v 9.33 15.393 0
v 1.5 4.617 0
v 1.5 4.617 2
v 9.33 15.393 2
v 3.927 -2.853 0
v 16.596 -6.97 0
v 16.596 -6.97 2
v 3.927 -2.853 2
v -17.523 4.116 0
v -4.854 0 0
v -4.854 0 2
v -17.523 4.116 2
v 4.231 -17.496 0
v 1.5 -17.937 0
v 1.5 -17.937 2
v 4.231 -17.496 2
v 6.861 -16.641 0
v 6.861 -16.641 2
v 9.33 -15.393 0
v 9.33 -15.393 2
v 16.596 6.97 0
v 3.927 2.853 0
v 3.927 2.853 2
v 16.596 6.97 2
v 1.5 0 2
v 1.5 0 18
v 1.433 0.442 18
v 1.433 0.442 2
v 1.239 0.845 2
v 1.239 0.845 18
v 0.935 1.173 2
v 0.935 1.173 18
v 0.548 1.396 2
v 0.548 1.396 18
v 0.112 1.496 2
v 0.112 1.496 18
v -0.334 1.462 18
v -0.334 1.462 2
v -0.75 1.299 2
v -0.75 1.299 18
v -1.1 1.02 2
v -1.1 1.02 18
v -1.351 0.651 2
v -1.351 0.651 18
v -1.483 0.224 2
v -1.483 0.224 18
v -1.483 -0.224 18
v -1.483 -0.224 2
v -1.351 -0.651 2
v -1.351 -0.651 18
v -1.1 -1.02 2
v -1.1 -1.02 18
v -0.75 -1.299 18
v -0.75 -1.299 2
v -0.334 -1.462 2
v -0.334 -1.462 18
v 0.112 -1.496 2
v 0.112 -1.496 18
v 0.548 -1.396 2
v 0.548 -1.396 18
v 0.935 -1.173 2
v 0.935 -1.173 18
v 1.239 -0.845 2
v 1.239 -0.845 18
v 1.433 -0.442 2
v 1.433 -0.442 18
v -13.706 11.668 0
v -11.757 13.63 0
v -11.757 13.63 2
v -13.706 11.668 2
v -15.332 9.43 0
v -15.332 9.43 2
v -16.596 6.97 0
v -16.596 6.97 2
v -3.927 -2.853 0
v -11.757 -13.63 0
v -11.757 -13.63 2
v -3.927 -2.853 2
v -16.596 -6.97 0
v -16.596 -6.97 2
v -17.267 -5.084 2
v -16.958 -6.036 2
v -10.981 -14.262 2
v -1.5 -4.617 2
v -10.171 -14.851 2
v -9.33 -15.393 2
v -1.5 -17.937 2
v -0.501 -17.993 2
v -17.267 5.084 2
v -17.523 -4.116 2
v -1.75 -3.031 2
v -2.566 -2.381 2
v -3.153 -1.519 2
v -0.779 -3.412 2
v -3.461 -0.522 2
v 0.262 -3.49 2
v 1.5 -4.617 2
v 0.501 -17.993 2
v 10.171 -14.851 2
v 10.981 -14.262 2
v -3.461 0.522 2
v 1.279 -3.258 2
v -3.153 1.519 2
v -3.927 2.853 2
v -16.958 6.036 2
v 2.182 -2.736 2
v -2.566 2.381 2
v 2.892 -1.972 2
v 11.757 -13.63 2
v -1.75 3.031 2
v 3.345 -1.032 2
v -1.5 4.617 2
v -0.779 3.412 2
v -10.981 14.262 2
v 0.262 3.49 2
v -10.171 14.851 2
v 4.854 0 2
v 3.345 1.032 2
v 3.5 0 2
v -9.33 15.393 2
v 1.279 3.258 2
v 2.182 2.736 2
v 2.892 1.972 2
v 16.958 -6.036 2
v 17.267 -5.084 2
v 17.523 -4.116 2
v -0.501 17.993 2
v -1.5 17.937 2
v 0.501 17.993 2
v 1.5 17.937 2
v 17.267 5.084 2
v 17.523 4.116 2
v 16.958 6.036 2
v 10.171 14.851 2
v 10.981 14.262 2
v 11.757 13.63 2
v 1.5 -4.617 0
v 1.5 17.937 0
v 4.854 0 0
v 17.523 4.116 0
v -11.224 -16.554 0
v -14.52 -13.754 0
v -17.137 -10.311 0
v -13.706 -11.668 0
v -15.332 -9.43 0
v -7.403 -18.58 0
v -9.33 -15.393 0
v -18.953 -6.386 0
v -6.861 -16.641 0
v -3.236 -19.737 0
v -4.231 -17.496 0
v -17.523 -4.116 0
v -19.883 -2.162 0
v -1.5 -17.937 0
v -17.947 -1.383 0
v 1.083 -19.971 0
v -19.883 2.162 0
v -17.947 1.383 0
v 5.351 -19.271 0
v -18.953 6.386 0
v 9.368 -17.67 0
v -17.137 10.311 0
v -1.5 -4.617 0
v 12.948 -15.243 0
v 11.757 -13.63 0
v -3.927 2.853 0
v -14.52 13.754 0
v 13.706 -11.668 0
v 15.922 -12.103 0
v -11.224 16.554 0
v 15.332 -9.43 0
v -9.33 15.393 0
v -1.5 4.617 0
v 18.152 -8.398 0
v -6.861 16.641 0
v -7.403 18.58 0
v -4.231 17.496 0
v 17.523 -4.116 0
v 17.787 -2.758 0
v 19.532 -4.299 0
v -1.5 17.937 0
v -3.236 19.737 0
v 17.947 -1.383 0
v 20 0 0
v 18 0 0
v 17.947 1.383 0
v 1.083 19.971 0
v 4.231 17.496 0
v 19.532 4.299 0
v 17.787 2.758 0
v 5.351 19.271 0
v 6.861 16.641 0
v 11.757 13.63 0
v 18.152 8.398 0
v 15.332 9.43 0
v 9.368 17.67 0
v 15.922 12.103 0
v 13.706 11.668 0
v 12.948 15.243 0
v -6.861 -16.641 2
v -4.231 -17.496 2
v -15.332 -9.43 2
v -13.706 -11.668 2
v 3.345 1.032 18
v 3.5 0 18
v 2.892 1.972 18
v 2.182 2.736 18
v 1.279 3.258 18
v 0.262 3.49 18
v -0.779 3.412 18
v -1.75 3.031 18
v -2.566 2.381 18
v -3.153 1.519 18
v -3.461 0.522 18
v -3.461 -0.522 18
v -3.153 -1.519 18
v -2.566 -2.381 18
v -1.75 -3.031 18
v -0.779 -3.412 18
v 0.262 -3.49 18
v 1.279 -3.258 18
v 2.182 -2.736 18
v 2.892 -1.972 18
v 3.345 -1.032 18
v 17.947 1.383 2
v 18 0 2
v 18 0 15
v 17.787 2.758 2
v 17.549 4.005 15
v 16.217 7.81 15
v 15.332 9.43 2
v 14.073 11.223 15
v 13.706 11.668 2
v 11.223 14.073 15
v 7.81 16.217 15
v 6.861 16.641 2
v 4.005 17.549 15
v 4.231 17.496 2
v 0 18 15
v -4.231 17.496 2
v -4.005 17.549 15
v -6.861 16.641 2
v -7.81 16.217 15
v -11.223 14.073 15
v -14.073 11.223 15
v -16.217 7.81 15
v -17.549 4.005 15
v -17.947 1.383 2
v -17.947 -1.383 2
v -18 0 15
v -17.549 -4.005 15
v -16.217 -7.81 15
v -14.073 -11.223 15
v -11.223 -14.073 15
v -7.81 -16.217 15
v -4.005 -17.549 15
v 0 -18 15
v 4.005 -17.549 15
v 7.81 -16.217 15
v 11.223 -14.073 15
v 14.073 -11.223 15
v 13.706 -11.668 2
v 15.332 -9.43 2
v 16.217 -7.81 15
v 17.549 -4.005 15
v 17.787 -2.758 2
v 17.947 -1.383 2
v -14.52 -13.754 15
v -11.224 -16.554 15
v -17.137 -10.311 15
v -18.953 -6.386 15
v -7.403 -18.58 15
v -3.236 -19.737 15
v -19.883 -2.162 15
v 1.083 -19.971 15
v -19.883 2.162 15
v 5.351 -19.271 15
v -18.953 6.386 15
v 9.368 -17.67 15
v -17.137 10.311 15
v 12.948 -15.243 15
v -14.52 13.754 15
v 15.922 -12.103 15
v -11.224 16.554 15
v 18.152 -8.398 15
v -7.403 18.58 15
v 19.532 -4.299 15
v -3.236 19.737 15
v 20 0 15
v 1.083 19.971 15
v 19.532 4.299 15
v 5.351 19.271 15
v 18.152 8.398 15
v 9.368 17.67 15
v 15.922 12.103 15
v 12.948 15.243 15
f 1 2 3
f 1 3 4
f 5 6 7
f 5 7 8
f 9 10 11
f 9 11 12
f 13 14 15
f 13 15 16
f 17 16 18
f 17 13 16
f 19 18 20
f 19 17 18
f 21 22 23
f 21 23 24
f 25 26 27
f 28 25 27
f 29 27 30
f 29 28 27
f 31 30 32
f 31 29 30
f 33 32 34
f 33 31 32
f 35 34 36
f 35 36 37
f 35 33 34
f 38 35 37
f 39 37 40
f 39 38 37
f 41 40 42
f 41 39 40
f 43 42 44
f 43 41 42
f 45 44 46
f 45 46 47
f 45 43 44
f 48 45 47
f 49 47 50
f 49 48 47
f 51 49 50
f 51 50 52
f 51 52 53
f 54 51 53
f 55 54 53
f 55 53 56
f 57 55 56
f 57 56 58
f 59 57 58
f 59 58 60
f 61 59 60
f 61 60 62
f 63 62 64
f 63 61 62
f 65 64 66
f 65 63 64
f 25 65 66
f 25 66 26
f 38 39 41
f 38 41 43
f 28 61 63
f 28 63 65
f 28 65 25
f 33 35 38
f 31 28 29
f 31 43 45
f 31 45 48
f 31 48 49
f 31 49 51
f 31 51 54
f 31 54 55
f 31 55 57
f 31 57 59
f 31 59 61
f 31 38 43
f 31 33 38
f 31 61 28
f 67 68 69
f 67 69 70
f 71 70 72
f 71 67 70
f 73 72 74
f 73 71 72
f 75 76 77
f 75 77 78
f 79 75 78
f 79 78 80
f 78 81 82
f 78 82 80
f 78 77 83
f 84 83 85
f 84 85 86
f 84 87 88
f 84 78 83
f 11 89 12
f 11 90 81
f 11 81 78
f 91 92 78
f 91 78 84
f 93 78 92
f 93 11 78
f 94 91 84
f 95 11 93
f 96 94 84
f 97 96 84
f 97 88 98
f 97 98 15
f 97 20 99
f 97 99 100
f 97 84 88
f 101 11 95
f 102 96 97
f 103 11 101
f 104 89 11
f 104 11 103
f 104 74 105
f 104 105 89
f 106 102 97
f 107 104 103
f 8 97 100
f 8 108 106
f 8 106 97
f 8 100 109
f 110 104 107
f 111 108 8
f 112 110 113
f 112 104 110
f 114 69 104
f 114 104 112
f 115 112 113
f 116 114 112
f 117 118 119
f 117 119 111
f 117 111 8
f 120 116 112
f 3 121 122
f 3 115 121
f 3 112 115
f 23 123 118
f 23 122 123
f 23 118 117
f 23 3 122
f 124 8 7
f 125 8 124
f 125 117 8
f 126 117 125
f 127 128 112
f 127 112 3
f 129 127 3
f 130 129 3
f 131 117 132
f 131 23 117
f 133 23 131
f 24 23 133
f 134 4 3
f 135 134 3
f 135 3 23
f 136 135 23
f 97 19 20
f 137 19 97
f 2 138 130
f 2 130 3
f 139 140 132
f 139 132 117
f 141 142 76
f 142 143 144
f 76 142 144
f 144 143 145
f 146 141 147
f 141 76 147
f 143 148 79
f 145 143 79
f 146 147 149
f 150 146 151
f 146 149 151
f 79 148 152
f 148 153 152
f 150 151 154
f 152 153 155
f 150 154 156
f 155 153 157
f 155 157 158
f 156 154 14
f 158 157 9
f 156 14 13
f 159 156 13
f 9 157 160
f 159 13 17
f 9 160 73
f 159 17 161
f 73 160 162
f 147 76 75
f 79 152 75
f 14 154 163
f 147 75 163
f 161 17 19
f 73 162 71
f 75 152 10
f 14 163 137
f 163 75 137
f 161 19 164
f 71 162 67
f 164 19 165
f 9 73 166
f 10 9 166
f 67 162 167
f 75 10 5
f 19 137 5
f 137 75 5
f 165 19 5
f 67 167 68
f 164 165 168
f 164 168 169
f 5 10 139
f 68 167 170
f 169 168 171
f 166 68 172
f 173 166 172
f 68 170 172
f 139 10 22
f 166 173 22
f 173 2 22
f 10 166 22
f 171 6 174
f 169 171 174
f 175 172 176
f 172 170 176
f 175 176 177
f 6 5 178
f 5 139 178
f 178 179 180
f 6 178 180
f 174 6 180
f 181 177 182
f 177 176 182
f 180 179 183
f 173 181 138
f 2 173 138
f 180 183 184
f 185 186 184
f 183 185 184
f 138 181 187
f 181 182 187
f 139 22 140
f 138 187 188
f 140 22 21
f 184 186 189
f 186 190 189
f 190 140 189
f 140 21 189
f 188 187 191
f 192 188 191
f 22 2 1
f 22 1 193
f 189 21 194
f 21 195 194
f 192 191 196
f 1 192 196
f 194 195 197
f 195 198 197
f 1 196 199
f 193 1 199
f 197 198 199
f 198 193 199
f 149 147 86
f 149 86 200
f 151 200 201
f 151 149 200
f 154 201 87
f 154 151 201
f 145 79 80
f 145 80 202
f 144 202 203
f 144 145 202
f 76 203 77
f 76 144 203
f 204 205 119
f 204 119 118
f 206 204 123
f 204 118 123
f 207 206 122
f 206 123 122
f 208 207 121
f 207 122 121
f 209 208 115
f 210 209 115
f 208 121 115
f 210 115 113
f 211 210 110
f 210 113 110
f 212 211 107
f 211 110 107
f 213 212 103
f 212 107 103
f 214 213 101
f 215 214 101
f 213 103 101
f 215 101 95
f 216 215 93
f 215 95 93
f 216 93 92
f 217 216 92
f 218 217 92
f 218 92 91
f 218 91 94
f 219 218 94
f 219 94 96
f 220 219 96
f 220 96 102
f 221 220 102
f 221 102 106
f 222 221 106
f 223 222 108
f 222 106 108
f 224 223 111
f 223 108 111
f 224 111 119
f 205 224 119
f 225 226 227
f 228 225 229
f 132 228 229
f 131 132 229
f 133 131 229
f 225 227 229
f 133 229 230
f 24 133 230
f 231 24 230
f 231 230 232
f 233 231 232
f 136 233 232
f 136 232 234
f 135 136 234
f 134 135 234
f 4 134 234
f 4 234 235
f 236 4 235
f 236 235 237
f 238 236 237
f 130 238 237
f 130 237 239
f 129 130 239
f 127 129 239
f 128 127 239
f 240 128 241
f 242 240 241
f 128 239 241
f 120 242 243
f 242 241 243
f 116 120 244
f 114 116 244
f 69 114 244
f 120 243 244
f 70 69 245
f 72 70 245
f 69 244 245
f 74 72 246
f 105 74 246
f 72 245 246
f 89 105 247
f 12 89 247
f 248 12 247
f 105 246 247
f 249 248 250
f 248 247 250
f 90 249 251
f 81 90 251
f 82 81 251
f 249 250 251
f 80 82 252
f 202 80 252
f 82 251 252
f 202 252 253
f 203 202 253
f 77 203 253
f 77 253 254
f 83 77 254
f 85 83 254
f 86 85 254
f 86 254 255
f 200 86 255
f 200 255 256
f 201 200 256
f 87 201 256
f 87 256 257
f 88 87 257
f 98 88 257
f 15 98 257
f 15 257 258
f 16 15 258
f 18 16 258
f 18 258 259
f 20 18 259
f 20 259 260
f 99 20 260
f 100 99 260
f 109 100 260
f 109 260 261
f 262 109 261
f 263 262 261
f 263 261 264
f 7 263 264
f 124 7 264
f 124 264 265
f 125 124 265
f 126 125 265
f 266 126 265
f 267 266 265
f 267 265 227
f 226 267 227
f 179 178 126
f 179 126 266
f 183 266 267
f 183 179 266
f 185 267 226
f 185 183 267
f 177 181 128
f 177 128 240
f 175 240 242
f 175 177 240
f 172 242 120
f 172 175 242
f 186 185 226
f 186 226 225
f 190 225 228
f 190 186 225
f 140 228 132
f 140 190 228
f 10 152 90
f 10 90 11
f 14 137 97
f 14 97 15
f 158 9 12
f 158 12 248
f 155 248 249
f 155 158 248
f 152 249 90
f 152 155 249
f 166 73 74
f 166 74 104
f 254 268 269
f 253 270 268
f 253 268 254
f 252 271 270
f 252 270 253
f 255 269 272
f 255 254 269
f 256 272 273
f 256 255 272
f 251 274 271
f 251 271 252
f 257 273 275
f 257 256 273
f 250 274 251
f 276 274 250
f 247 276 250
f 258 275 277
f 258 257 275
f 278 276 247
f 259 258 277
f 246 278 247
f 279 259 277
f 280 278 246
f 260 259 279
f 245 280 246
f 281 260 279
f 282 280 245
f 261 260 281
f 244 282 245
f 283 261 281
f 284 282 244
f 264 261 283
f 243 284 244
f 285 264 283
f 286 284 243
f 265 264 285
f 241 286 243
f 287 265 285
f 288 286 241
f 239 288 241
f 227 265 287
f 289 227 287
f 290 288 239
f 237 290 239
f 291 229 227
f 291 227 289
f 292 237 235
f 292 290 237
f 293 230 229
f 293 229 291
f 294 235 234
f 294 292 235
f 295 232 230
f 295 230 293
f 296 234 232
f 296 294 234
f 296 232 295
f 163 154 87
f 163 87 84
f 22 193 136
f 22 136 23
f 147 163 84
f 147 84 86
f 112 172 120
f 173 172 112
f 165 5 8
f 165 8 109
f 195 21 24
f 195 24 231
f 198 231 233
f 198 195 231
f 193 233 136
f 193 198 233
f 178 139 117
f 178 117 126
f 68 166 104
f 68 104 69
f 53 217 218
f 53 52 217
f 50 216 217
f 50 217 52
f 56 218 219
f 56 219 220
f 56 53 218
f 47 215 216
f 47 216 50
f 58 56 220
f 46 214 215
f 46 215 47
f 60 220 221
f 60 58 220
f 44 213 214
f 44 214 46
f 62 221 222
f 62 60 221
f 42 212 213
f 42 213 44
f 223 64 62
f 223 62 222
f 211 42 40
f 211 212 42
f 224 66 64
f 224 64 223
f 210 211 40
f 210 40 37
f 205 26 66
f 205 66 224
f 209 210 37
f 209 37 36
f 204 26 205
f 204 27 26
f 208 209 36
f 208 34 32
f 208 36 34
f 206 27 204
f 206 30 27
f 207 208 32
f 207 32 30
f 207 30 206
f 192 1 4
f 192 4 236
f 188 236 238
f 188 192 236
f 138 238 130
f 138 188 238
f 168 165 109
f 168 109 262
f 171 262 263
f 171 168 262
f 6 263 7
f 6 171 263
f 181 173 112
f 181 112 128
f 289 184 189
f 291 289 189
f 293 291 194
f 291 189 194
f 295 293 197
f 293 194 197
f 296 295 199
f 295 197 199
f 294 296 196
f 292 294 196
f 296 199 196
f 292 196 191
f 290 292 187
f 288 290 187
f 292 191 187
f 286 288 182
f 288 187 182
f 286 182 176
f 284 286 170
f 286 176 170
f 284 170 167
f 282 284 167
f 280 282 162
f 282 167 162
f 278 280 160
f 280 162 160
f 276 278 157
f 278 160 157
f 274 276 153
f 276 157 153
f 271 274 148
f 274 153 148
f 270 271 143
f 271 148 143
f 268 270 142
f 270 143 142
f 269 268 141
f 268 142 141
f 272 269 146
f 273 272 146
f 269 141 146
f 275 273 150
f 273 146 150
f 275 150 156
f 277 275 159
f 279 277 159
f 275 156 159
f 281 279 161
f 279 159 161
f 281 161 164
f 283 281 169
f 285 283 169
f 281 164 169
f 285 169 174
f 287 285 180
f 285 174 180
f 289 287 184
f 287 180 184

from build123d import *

# Parameters (mm, degrees)
F0_R     = 20
F1_DEPTH = 15
F2_R     = 18
F3_DEPTH = 13
F5_R     = 3.5
F5_R_2   = 1.5
F6_DEPTH = 16
F8_DEPTH = 2


with BuildPart() as f1:
    # F0 (on Top) → F1 (new body)
    with BuildSketch(Plane.XY):
        Circle(F0_R)
    extrude(amount=F1_DEPTH)

    # F2 (on face) → F3 (cut)
    with BuildSketch(Plane.XY.offset(15)):
        Circle(F2_R)
    extrude(amount=-F3_DEPTH, mode=Mode.SUBTRACT)

    # F5 (on face) → F6 (join)
    with BuildSketch(Plane.XY.offset(2)):
        Circle(F5_R)
        Circle(F5_R_2, mode=Mode.SUBTRACT)
    extrude(amount=F6_DEPTH)

    # F7 (on Top) → F8 (cut)
    with BuildSketch(Plane.XY):
        with BuildLine():
            ThreePointArc((-9.3298084702, -15.3933321249), (-5.5623058987, -17.1190172933), (-1.5, -17.9373911147))
            Line((-1.5, -17.9373911147), (-1.5, -4.6165253058))
            Line((-1.5, -4.6165253058), (-9.3298084702, -15.3933321249))
        make_face()
        with BuildLine():
            Line((9.3298084702, -15.3933321249), (1.5, -4.6165253058))
            Line((1.5, -4.6165253058), (1.5, -17.9373911147))
            ThreePointArc((1.5, -17.9373911147), (5.5623058987, -17.1190172933), (9.3298084702, -15.3933321249))
        make_face()
        with BuildLine():
            Line((16.5959472134, -6.9695434636), (3.9270509831, -2.8531695489))
            Line((3.9270509831, -2.8531695489), (11.7568594534, -13.6299763681))
            ThreePointArc((11.7568594534, -13.6299763681), (14.5623058987, -10.5801345413), (16.5959472134, -6.9695434636))
        make_face()
        with BuildLine():
            Line((17.5229981965, 4.1163739147), (4.8541019662, 0))
            Line((4.8541019662, 0), (17.5229981965, -4.1163739147))
            ThreePointArc((17.5229981965, -4.1163739147), (17.8803518916, -2.071959515), (18, 0))
            ThreePointArc((18, 0), (17.8803518916, 2.071959515), (17.5229981965, 4.1163739147))
        make_face()
        with BuildLine():
            Line((11.7568594534, 13.6299763681), (3.9270509831, 2.8531695489))
            Line((3.9270509831, 2.8531695489), (16.5959472134, 6.9695434636))
            ThreePointArc((16.5959472134, 6.9695434636), (14.5623058987, 10.5801345413), (11.7568594534, 13.6299763681))
        make_face()
        with BuildLine():
            Line((1.5, 17.9373911147), (1.5, 4.6165253058))
            Line((1.5, 4.6165253058), (9.3298084702, 15.3933321249))
            ThreePointArc((9.3298084702, 15.3933321249), (5.5623058987, 17.1190172933), (1.5, 17.9373911147))
        make_face()
        with BuildLine():
            Line((-1.5, 4.6165253058), (-1.5, 17.9373911147))
            ThreePointArc((-1.5, 17.9373911147), (-5.5623058987, 17.1190172933), (-9.3298084702, 15.3933321249))
            Line((-9.3298084702, 15.3933321249), (-1.5, 4.6165253058))
        make_face()
        with BuildLine():
            Line((-3.9270509831, 2.8531695489), (-11.7568594534, 13.6299763681))
            ThreePointArc((-11.7568594534, 13.6299763681), (-14.5623058987, 10.5801345413), (-16.5959472134, 6.9695434636))
            Line((-16.5959472134, 6.9695434636), (-3.9270509831, 2.8531695489))
        make_face()
        with BuildLine():
            Line((-4.8541019662, 0), (-17.5229981965, 4.1163739147))
            ThreePointArc((-17.5229981965, 4.1163739147), (-18, 0), (-17.5229981965, -4.1163739147))
            Line((-17.5229981965, -4.1163739147), (-4.8541019662, 0))
        make_face()
        with BuildLine():
            ThreePointArc((-16.5959472134, -6.9695434636), (-14.5623058987, -10.5801345413), (-11.7568594534, -13.6299763681))
            Line((-11.7568594534, -13.6299763681), (-3.9270509831, -2.8531695489))
            Line((-3.9270509831, -2.8531695489), (-16.5959472134, -6.9695434636))
        make_face()
    extrude(amount=F8_DEPTH, mode=Mode.SUBTRACT)


solid = f1.part
